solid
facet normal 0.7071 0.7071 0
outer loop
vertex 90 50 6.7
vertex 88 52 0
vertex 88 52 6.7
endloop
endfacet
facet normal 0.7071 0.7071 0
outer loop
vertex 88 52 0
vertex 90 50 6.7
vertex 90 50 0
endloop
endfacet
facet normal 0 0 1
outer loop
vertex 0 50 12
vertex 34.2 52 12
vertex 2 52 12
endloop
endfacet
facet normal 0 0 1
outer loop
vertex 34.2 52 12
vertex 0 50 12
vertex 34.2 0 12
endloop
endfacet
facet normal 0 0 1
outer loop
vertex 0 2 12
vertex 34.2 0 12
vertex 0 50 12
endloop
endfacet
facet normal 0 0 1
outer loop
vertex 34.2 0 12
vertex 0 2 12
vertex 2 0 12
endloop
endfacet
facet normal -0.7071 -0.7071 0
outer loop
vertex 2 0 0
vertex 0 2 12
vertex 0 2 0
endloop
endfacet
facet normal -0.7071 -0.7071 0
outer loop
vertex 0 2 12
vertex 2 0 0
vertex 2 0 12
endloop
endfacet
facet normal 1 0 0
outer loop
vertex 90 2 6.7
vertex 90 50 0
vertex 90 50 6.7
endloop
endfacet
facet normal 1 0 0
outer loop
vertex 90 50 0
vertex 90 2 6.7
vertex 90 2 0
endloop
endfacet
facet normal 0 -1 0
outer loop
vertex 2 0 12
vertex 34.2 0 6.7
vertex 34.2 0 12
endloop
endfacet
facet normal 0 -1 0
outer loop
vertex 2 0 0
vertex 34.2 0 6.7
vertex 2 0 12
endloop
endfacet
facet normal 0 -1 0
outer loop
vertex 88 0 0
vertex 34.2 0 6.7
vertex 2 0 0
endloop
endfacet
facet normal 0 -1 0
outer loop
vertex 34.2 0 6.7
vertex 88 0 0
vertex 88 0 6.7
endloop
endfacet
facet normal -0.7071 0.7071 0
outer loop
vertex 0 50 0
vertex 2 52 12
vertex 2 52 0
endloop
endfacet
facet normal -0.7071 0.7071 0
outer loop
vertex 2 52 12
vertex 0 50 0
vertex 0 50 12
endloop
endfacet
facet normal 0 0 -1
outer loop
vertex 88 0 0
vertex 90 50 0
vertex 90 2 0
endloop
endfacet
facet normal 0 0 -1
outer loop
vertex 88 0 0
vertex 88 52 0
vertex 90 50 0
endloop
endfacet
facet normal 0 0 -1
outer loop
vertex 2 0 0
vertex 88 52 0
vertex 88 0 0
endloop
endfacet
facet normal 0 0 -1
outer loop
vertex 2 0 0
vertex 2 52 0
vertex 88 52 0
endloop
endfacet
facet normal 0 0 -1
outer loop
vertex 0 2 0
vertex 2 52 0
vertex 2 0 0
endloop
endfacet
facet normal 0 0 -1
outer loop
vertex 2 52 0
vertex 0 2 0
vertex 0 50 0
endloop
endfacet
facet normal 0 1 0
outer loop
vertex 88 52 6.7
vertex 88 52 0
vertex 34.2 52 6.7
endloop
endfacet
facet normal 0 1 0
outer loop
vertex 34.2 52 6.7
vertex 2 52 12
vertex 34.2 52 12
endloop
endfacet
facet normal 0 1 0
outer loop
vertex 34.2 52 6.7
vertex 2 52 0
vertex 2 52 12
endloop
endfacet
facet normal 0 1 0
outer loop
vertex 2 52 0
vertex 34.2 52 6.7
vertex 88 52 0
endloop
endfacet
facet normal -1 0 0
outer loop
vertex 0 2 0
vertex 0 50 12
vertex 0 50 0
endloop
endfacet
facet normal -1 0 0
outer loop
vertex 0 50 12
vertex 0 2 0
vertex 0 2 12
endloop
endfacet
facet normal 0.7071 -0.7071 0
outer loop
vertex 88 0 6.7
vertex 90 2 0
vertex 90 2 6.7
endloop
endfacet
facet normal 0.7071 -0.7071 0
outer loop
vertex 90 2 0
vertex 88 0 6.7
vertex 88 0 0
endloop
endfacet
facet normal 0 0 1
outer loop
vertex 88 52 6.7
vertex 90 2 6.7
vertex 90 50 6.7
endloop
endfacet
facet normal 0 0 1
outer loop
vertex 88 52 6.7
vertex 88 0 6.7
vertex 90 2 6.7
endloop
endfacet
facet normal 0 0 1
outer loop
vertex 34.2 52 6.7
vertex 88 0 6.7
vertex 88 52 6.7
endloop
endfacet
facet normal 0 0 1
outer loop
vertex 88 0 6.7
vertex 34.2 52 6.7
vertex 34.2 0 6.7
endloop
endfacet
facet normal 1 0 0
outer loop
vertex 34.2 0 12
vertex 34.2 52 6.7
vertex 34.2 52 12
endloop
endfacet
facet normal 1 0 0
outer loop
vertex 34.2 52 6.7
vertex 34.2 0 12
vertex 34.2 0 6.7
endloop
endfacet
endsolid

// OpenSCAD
$fn = 32;

// ----------------------------------------------------------------------
// Stepped bar: endstep, 90 x 52 x 12/6.7 mm
// ----------------------------------------------------------------------

// --- parameters (mm) ---
bar_l = 90;               // bar length, X
bar_w = 52;               // bar width, Y
plate_t = 12;             // thickness of the thick zone, Z
thin_t = 6.7;             // thickness of the thin zone
corner_c = 2;             // corner chamfer of the bar
step_cut = 5.3;           // material removed from the thin zone
step_x = 34.2;            // step position from the left end
depth_1 = 5.3;            // depth of cut 1 from the top face

profile = [[2, 0], [88, 0], [90, 2], [90, 50], [88, 52], [2, 52], [0, 50], [0, 2]];  // primary outline, 8 points, counter clockwise
void_1 = [[34.2, -1], [91, -1], [91, 53], [34.2, 53]];  // thin zone beyond the step, 4 points

// --- the one profile operation ---
difference() {
  linear_extrude(height = plate_t) polygon(points = profile);
  translate([0, 0, plate_t - depth_1])
    linear_extrude(height = depth_1 + 1) polygon(points = void_1);
}
